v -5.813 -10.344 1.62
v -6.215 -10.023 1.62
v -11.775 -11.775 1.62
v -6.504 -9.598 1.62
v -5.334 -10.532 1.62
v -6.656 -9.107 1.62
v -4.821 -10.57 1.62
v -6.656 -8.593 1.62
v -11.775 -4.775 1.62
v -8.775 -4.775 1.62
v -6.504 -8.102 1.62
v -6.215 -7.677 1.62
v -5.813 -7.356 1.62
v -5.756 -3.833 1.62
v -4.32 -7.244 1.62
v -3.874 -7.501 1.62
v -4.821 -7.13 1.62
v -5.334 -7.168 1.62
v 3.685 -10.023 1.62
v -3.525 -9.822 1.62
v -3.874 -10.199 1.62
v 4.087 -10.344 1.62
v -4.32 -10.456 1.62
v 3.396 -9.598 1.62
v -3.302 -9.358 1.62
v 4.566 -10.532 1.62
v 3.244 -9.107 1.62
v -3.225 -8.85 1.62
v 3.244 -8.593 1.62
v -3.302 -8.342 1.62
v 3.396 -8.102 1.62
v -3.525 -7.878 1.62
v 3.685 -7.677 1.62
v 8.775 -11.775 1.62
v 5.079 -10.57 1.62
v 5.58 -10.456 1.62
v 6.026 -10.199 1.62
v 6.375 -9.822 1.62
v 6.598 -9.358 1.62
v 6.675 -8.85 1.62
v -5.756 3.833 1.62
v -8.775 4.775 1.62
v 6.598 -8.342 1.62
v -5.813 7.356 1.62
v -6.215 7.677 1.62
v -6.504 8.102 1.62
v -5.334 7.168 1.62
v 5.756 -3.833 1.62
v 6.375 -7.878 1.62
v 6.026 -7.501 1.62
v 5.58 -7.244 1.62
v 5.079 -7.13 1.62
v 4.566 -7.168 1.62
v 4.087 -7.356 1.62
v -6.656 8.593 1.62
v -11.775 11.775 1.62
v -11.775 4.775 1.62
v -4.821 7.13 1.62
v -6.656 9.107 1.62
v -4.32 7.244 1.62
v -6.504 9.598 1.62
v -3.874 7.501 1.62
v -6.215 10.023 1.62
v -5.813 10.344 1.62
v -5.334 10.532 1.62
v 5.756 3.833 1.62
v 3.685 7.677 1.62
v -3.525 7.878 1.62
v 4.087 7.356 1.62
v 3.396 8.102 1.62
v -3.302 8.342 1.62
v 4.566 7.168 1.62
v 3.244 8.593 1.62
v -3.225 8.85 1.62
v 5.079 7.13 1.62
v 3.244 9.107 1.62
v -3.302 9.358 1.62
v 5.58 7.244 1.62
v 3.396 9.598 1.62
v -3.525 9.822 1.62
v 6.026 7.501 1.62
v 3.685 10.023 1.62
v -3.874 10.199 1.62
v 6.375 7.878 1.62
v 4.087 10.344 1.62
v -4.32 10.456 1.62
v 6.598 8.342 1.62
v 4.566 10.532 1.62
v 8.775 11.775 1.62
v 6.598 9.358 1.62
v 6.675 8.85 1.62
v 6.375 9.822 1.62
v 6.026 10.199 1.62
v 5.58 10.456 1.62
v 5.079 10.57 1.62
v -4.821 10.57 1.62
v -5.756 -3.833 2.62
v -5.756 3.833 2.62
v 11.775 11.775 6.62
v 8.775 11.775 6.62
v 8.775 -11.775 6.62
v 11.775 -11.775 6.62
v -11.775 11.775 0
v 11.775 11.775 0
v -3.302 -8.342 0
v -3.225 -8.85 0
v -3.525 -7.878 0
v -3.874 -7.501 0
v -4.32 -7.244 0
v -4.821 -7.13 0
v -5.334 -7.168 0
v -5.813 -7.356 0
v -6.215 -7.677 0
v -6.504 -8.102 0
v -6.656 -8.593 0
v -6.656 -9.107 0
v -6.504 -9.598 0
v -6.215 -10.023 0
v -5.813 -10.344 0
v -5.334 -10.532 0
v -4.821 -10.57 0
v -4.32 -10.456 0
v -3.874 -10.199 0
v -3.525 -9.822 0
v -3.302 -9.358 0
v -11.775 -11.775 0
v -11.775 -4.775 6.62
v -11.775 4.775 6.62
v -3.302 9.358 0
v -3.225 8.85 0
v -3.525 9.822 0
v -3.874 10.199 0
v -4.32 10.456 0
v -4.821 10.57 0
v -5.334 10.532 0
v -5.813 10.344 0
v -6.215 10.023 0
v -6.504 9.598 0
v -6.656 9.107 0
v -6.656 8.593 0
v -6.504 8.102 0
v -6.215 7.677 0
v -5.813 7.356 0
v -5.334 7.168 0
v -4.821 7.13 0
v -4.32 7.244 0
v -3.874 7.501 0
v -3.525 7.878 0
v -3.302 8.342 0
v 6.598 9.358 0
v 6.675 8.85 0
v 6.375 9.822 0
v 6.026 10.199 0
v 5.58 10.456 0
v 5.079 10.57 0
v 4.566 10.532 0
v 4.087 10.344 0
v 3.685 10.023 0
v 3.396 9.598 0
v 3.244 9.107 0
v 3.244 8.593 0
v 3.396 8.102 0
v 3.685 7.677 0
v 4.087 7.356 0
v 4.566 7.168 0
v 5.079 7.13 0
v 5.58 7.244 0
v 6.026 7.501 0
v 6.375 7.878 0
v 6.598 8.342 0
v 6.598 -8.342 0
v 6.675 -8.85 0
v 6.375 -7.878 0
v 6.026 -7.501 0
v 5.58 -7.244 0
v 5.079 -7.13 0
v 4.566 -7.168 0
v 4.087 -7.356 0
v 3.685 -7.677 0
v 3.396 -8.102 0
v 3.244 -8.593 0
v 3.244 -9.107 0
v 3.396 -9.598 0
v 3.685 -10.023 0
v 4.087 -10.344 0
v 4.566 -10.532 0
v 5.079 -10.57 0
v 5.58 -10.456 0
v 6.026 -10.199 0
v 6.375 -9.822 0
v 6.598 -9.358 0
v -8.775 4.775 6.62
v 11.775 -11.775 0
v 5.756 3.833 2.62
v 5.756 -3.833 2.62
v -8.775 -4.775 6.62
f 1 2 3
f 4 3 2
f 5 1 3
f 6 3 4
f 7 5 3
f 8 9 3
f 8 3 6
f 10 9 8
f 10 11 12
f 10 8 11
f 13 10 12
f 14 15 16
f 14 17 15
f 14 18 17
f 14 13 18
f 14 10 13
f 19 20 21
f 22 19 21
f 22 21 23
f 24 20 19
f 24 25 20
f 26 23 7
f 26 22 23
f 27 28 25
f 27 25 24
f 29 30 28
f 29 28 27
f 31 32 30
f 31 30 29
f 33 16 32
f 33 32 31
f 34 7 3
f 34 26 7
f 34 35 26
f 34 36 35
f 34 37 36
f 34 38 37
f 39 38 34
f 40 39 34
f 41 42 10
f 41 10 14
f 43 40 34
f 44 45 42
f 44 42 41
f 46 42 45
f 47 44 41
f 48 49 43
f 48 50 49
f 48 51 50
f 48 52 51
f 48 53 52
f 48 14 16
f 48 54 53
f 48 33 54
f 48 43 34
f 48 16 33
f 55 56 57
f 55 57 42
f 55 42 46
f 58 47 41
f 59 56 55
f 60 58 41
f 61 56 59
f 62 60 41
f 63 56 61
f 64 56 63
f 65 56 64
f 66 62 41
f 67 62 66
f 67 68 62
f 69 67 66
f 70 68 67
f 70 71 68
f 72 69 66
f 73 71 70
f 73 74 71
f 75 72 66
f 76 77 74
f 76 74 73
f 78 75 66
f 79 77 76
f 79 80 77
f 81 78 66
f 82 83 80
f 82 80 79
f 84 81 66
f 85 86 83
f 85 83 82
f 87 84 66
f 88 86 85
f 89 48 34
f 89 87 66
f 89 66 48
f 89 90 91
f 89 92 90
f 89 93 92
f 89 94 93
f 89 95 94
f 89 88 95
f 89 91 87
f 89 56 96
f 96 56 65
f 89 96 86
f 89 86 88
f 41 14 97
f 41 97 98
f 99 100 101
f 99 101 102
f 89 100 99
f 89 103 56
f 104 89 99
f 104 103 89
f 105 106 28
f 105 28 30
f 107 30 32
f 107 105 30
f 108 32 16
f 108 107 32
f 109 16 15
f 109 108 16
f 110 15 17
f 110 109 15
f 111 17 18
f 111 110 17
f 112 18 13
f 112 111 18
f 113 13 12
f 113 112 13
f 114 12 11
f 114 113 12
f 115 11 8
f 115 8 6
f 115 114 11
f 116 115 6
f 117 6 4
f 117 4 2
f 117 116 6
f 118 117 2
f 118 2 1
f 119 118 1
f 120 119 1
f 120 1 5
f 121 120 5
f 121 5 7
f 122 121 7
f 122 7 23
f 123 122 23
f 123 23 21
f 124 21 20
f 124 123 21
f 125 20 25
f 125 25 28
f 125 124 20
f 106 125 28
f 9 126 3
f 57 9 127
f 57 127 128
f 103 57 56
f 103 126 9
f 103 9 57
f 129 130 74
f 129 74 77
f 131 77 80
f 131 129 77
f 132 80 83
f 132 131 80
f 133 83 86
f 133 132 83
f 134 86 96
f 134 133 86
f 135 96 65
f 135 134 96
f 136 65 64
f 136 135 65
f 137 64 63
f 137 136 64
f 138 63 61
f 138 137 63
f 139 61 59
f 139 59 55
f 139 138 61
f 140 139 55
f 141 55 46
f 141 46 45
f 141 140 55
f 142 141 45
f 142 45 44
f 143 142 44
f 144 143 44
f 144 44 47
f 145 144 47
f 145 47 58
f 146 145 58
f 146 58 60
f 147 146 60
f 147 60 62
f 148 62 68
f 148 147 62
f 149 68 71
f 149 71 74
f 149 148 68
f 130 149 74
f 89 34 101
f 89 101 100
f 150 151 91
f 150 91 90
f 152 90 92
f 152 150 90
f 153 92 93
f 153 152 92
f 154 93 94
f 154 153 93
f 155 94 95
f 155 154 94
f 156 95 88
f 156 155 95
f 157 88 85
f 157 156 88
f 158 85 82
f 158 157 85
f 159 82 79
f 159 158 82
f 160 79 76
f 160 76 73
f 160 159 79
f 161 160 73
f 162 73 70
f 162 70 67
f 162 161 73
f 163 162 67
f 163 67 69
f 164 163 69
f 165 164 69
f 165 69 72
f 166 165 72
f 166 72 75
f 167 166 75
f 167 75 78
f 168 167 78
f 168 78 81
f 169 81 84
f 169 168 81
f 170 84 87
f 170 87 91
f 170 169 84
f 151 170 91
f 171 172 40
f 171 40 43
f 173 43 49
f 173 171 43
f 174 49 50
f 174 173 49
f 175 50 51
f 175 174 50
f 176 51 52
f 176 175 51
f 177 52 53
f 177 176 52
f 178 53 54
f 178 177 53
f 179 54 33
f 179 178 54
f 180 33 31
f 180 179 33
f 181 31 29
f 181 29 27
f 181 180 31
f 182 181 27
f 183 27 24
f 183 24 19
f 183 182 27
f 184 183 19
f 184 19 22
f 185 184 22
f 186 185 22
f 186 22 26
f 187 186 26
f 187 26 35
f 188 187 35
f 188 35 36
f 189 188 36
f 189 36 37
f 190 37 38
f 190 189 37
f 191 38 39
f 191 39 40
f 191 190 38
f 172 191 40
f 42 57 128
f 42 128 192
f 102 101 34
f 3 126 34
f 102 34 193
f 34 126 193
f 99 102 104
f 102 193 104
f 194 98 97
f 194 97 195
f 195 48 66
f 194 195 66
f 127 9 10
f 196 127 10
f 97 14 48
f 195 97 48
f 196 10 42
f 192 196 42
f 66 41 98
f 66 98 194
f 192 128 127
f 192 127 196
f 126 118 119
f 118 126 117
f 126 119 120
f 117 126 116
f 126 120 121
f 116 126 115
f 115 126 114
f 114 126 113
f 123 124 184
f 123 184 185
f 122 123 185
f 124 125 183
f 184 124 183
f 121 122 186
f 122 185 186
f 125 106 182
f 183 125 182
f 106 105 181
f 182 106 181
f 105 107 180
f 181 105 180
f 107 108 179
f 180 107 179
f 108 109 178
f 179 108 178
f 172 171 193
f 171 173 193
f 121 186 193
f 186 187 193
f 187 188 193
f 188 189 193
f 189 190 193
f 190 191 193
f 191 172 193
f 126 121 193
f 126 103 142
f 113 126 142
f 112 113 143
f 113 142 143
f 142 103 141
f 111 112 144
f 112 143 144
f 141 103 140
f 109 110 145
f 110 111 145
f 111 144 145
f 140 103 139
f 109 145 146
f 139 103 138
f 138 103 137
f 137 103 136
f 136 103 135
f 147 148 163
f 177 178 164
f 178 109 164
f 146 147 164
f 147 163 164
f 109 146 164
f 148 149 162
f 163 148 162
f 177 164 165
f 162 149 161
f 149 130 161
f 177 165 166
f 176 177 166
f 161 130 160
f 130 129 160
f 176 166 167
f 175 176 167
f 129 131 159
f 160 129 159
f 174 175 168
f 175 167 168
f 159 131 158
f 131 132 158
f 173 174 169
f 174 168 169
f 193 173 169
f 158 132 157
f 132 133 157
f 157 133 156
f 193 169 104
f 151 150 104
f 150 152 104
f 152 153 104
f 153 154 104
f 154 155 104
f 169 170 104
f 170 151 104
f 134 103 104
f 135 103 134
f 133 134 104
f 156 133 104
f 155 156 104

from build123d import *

# Parameters (mm, degrees)
F0_W     = 23.55
F0_H     = 23.55
F0_R     = 1.725
F1_DEPTH = 1.62
F2_W     = 3
F2_H     = 23.55
F2_H_2   = 9.55
F3_DEPTH = 5
F4_W     = 11.512548
F4_H     = 7.665078
F5_DEPTH = 1


with BuildPart() as f1:
    # F0 (on Top) → F1 (new body)
    with BuildSketch(Plane.XY):
        Rectangle(F0_W, F0_H)
        with Locations((-4.95, -8.85)):
            Circle(F0_R, mode=Mode.SUBTRACT)
        with Locations((4.95, -8.85)):
            Circle(F0_R, mode=Mode.SUBTRACT)
        with Locations((-4.95, 8.85)):
            Circle(F0_R, mode=Mode.SUBTRACT)
        with Locations((4.95, 8.85)):
            Circle(F0_R, mode=Mode.SUBTRACT)
    extrude(amount=F1_DEPTH)

    # F2 (on face) → F3 (join)
    with BuildSketch(Plane.XY.offset(1.62)):
        with Locations((10.275, 0)):
            Rectangle(F2_W, F2_H)
        with Locations((-10.275, 0)):
            Rectangle(F2_W, F2_H_2)
    extrude(amount=F3_DEPTH)

    # F4 (on face) → F5 (join)
    with BuildSketch(Plane.XY.offset(1.62)):
        Rectangle(F4_W, F4_H)
    extrude(amount=F5_DEPTH)


solid = f1.part
